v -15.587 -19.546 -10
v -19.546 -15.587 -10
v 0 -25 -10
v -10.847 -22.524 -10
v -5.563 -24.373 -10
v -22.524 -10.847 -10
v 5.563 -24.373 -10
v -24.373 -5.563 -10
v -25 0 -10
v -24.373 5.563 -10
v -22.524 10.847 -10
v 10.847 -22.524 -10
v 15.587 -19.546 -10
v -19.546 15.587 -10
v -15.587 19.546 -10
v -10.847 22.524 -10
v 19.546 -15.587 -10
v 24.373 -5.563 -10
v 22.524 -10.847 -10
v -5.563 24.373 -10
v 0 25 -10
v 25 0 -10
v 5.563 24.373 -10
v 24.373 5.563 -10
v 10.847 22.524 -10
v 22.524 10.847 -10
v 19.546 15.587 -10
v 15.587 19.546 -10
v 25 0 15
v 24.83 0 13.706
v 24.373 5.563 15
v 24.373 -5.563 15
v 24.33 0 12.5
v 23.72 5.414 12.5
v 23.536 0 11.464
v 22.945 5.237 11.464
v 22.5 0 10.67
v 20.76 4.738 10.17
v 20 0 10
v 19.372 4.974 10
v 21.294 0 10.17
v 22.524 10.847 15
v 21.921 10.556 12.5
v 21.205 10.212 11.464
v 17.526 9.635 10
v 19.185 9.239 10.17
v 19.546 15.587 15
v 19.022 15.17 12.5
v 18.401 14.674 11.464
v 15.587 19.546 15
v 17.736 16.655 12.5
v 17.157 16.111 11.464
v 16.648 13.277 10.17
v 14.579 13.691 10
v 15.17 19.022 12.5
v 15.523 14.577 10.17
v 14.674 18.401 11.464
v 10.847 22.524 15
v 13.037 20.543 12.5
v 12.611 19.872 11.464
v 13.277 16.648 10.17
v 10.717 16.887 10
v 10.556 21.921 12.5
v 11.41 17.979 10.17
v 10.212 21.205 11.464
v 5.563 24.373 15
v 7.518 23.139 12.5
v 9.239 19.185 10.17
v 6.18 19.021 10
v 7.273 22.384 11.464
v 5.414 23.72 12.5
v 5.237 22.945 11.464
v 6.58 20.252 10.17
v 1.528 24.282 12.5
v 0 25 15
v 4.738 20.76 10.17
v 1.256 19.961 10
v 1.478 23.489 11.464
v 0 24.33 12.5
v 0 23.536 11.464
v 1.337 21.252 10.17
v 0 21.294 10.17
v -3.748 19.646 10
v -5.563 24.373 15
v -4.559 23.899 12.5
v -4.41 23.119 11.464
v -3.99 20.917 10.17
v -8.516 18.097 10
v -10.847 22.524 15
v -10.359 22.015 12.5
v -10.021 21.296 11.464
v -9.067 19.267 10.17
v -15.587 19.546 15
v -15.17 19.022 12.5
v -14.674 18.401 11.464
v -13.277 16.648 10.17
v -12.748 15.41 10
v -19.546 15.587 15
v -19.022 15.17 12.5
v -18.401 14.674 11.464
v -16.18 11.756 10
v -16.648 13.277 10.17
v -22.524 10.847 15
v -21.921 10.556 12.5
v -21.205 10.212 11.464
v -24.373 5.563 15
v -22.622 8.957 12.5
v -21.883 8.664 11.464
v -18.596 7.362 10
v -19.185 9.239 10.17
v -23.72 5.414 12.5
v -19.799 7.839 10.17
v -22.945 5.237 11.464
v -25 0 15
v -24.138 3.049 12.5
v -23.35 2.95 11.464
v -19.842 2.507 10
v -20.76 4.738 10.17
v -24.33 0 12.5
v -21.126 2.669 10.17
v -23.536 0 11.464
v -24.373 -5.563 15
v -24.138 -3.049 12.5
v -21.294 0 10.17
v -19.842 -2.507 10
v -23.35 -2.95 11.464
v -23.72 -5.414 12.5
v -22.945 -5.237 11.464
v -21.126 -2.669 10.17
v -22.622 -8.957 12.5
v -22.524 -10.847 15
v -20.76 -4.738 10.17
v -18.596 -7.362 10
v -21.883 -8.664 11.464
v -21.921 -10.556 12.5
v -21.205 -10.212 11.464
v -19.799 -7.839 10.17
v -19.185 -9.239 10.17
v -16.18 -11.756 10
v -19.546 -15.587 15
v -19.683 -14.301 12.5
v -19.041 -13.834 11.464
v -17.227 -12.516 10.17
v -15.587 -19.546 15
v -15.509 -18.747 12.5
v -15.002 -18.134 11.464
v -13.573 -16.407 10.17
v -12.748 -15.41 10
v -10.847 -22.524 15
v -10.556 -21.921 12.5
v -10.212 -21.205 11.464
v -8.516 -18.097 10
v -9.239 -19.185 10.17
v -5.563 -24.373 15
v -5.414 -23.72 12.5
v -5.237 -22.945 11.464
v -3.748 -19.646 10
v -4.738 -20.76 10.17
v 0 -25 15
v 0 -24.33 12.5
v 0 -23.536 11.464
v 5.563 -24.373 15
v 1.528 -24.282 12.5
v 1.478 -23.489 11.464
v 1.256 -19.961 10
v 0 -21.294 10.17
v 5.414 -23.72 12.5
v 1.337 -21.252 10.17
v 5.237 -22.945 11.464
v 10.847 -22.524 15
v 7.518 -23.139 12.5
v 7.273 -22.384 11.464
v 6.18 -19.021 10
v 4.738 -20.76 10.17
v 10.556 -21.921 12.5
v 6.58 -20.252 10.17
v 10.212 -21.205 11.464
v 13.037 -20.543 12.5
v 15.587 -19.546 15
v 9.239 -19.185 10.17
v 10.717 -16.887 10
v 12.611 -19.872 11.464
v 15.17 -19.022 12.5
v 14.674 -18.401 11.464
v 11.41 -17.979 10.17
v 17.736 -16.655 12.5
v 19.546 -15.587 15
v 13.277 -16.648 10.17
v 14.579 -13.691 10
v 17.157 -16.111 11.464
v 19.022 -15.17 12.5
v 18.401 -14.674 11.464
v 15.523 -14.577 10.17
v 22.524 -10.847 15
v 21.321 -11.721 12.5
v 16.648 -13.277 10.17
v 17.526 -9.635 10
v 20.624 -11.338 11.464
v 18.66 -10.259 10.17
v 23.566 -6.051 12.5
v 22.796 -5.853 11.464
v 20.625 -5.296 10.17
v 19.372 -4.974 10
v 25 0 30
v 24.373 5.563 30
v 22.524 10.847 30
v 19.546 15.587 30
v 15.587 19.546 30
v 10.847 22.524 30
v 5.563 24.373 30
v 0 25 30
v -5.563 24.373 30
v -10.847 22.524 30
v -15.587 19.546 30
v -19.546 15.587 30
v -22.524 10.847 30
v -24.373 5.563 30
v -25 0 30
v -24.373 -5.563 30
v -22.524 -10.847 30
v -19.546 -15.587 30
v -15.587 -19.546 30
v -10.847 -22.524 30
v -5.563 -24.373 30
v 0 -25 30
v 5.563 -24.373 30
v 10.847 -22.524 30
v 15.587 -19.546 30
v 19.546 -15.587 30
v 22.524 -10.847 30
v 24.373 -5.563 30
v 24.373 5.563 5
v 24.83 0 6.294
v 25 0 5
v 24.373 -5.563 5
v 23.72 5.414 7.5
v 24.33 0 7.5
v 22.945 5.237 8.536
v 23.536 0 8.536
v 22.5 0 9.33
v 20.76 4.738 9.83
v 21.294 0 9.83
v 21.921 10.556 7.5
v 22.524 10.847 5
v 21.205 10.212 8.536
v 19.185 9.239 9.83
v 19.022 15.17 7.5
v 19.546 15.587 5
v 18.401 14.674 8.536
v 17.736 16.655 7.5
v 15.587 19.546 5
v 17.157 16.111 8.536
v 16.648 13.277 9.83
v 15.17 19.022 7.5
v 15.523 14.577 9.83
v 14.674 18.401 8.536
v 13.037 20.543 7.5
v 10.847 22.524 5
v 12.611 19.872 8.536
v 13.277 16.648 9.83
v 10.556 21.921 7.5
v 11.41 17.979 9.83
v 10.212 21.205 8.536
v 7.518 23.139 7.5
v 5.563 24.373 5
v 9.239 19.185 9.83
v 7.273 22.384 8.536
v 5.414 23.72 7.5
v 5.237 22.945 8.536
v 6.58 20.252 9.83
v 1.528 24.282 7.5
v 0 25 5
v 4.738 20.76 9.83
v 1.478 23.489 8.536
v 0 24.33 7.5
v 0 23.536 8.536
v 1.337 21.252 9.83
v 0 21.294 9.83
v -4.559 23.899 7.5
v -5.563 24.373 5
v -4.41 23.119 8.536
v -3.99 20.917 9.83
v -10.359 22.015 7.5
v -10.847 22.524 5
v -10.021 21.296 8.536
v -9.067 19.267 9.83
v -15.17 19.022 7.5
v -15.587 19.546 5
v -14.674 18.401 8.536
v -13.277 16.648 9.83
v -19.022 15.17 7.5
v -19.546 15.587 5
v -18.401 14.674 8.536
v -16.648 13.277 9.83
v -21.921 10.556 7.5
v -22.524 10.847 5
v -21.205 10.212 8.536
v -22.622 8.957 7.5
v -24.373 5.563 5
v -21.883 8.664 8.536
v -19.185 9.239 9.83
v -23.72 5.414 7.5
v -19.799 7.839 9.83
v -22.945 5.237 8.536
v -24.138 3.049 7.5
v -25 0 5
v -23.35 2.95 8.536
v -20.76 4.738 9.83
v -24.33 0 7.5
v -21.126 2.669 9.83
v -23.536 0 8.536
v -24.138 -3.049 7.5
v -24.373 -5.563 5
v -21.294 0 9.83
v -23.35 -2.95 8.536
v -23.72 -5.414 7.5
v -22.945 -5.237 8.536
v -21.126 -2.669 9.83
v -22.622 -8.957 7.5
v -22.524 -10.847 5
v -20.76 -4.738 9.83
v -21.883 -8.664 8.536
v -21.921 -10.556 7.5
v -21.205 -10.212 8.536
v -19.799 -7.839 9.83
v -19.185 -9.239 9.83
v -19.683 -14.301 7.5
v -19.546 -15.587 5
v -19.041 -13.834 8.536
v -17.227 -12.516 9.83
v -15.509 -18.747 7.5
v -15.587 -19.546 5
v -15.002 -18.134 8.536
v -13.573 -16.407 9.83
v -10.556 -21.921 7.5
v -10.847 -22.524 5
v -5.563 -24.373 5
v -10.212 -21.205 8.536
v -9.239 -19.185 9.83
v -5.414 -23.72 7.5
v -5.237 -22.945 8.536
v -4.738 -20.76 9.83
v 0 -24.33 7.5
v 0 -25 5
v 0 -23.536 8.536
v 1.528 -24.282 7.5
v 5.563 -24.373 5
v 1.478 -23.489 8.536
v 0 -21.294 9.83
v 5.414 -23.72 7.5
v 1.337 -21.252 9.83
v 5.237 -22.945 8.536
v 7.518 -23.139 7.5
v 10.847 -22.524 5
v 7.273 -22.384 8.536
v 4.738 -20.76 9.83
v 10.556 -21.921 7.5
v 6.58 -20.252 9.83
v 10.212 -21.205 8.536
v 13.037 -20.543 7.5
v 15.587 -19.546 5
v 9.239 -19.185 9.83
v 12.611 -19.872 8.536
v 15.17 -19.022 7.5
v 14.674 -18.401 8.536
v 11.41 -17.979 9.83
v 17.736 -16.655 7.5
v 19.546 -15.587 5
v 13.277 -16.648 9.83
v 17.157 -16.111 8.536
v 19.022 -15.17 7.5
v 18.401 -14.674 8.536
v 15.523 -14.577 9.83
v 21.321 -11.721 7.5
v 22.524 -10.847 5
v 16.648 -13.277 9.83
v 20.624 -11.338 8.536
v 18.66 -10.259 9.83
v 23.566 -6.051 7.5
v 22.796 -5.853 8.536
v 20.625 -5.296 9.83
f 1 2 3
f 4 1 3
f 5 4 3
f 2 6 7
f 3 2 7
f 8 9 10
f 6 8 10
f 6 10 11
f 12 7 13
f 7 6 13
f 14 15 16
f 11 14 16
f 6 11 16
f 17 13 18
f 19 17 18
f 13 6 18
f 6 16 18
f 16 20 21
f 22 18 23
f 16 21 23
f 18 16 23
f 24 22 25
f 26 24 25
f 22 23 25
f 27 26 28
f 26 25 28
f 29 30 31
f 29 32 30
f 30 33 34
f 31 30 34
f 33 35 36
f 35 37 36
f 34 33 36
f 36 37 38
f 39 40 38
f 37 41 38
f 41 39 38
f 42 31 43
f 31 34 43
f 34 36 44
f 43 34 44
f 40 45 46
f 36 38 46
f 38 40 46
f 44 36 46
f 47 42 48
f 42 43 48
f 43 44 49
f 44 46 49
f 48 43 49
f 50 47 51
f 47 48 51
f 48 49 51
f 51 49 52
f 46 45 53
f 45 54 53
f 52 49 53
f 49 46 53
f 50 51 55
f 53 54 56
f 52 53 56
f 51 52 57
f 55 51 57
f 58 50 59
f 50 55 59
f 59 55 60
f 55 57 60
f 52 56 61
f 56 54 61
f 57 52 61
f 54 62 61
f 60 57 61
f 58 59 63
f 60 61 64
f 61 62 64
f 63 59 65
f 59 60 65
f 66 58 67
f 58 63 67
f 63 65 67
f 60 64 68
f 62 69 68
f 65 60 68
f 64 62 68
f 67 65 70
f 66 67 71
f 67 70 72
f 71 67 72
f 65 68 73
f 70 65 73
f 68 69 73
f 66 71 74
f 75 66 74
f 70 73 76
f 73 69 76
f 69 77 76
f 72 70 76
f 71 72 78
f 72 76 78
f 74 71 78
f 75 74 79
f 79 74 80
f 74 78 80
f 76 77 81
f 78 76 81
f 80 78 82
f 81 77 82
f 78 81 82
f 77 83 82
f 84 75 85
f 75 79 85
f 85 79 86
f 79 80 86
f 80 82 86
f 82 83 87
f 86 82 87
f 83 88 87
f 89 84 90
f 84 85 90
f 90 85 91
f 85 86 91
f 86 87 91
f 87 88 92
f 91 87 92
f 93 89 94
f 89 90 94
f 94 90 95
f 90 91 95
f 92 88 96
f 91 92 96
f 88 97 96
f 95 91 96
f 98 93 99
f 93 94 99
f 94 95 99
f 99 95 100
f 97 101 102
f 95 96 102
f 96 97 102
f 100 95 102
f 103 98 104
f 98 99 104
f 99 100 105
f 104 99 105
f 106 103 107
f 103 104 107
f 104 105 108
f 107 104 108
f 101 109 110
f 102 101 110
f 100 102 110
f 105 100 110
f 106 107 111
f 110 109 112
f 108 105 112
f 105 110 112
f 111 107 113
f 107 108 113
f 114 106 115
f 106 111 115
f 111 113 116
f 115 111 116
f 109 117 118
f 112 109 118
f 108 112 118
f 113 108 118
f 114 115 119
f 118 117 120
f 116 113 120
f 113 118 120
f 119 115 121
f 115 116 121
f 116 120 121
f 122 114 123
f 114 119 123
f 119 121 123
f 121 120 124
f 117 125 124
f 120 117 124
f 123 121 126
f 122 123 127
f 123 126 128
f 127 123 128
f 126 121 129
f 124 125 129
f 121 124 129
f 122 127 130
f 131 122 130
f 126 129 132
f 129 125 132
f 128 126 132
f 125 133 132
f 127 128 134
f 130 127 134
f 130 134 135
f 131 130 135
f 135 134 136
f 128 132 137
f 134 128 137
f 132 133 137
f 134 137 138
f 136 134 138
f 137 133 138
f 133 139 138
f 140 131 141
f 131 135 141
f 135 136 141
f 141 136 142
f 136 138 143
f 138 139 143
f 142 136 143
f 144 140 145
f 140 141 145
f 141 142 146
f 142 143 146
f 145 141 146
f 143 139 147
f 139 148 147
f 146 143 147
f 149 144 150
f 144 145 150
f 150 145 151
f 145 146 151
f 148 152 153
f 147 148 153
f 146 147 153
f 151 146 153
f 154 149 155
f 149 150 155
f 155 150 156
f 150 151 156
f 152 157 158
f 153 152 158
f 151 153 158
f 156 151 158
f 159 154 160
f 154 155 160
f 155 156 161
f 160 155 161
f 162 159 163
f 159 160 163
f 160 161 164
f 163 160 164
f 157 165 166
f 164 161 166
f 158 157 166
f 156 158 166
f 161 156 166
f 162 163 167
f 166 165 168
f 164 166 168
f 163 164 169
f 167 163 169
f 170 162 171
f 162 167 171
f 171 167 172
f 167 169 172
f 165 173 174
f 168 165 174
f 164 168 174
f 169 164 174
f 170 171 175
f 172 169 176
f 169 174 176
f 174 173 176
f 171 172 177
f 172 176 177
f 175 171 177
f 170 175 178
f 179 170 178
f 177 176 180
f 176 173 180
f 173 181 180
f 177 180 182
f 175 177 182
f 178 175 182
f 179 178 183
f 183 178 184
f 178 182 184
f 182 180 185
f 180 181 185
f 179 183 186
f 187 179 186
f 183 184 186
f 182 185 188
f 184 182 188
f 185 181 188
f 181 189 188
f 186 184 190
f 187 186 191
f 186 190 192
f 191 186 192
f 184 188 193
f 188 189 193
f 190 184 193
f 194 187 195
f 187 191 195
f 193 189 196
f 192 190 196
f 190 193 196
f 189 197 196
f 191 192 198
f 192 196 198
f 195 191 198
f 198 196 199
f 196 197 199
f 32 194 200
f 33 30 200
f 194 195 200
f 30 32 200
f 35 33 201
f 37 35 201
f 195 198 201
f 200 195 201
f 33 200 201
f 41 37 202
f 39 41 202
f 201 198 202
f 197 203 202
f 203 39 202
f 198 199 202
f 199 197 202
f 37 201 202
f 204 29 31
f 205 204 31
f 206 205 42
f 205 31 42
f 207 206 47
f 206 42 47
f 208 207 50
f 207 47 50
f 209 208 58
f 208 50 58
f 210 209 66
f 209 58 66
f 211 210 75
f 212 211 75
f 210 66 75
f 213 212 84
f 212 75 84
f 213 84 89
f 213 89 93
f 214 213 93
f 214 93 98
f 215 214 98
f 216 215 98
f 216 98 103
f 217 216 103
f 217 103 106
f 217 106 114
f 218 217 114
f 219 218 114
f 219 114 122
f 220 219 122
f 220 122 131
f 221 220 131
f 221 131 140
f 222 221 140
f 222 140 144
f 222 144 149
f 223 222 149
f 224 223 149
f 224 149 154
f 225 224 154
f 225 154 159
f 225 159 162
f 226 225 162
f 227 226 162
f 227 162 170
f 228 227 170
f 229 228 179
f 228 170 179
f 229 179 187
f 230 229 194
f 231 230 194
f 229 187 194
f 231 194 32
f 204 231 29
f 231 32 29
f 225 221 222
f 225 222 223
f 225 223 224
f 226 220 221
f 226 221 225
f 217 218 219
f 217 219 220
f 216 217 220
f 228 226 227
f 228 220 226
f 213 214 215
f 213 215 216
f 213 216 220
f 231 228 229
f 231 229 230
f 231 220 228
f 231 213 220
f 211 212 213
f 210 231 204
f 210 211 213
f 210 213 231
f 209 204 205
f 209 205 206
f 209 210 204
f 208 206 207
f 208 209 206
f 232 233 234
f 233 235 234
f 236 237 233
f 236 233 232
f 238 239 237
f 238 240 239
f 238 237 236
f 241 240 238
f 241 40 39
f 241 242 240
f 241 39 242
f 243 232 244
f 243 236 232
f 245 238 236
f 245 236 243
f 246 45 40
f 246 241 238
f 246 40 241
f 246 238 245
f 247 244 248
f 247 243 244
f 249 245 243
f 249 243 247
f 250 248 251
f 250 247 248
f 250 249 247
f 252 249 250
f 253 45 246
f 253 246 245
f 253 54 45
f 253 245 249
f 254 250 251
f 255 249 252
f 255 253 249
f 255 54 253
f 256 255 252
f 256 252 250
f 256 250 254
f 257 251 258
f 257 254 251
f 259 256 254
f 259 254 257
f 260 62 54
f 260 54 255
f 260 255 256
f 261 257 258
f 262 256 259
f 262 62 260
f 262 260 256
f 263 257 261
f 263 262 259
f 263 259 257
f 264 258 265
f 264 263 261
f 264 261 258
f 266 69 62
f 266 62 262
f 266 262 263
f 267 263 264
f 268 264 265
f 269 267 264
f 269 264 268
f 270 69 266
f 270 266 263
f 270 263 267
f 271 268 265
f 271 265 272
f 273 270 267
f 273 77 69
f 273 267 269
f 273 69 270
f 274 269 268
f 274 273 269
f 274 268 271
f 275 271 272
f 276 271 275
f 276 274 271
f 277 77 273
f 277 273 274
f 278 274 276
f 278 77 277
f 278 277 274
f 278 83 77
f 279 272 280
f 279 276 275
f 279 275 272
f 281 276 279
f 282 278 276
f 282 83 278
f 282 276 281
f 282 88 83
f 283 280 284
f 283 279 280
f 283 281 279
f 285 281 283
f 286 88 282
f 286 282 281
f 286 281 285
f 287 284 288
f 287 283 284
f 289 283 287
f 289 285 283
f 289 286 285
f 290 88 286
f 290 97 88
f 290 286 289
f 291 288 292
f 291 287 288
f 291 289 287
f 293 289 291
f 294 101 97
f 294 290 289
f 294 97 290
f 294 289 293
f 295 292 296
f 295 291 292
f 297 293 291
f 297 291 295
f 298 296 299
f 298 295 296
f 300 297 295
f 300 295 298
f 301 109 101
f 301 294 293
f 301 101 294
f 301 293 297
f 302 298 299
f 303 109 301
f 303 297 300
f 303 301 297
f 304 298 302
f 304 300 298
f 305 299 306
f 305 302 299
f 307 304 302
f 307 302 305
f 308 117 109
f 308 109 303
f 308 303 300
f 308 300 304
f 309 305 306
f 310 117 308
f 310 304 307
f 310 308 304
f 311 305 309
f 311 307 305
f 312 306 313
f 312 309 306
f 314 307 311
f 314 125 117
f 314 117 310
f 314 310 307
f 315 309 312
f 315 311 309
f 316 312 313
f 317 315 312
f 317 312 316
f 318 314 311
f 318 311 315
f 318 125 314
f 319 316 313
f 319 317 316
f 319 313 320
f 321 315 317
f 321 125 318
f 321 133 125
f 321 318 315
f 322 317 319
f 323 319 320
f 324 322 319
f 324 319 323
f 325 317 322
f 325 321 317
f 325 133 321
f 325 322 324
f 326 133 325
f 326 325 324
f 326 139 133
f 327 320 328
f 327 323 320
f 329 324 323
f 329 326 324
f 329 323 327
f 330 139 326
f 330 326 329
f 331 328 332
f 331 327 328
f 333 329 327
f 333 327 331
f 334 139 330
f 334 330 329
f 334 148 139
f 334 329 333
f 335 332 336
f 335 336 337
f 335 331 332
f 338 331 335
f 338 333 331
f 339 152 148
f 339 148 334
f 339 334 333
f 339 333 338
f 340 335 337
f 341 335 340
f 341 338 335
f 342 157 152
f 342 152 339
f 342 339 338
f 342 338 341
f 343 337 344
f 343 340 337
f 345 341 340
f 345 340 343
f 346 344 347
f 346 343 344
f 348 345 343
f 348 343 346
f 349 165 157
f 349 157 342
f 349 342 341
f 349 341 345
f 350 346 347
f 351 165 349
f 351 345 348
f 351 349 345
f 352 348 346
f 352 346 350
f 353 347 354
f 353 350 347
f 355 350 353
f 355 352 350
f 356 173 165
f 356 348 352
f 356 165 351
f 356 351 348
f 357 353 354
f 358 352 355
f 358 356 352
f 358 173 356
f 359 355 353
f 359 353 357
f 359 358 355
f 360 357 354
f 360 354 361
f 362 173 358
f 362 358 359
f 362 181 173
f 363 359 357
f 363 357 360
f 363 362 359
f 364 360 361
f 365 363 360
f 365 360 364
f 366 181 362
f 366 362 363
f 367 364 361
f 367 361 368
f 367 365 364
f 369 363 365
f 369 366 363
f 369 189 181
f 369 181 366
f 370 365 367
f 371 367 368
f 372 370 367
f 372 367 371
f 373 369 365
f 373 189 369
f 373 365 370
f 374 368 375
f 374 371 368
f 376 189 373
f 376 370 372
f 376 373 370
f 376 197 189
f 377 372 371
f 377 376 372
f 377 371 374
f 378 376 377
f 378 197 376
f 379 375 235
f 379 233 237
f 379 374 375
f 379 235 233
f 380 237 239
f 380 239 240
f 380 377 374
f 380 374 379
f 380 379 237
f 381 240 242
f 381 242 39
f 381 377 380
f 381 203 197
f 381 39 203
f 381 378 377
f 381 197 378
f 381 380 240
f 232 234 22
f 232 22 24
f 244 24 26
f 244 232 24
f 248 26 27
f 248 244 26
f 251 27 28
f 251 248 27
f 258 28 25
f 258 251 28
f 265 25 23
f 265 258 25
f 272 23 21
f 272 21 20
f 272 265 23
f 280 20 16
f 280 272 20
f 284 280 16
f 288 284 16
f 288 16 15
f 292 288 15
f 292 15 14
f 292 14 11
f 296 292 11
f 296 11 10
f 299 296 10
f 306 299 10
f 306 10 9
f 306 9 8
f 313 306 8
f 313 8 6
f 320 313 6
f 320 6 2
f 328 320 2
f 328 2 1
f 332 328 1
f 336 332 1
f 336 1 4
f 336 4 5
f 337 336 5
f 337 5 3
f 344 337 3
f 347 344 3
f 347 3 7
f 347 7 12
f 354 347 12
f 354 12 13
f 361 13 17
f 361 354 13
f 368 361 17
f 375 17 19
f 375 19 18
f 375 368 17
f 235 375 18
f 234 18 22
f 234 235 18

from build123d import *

# Parameters (mm, degrees)
F0_R     = 25
F1_DEPTH = 10
F2_R     = 5


with BuildPart() as f1:
    # F0 (on Top) → F1 (new body, symmetric)
    with BuildSketch(Plane.XY):
        Circle(F0_R)
    extrude(amount=F1_DEPTH, both=True)

    # F2
    f2_edges = [f1.edges().sort_by_distance(p)[0] for p in [
        (-25, 0, 10),
    ]]
    fillet(f2_edges, radius=F2_R)

    # F3: F1 across face


with BuildPart() as f1_1:
    add(f1.part)
    add(f1.part.mirror(Plane.XY.offset(10)))


solid = f1_1.part
